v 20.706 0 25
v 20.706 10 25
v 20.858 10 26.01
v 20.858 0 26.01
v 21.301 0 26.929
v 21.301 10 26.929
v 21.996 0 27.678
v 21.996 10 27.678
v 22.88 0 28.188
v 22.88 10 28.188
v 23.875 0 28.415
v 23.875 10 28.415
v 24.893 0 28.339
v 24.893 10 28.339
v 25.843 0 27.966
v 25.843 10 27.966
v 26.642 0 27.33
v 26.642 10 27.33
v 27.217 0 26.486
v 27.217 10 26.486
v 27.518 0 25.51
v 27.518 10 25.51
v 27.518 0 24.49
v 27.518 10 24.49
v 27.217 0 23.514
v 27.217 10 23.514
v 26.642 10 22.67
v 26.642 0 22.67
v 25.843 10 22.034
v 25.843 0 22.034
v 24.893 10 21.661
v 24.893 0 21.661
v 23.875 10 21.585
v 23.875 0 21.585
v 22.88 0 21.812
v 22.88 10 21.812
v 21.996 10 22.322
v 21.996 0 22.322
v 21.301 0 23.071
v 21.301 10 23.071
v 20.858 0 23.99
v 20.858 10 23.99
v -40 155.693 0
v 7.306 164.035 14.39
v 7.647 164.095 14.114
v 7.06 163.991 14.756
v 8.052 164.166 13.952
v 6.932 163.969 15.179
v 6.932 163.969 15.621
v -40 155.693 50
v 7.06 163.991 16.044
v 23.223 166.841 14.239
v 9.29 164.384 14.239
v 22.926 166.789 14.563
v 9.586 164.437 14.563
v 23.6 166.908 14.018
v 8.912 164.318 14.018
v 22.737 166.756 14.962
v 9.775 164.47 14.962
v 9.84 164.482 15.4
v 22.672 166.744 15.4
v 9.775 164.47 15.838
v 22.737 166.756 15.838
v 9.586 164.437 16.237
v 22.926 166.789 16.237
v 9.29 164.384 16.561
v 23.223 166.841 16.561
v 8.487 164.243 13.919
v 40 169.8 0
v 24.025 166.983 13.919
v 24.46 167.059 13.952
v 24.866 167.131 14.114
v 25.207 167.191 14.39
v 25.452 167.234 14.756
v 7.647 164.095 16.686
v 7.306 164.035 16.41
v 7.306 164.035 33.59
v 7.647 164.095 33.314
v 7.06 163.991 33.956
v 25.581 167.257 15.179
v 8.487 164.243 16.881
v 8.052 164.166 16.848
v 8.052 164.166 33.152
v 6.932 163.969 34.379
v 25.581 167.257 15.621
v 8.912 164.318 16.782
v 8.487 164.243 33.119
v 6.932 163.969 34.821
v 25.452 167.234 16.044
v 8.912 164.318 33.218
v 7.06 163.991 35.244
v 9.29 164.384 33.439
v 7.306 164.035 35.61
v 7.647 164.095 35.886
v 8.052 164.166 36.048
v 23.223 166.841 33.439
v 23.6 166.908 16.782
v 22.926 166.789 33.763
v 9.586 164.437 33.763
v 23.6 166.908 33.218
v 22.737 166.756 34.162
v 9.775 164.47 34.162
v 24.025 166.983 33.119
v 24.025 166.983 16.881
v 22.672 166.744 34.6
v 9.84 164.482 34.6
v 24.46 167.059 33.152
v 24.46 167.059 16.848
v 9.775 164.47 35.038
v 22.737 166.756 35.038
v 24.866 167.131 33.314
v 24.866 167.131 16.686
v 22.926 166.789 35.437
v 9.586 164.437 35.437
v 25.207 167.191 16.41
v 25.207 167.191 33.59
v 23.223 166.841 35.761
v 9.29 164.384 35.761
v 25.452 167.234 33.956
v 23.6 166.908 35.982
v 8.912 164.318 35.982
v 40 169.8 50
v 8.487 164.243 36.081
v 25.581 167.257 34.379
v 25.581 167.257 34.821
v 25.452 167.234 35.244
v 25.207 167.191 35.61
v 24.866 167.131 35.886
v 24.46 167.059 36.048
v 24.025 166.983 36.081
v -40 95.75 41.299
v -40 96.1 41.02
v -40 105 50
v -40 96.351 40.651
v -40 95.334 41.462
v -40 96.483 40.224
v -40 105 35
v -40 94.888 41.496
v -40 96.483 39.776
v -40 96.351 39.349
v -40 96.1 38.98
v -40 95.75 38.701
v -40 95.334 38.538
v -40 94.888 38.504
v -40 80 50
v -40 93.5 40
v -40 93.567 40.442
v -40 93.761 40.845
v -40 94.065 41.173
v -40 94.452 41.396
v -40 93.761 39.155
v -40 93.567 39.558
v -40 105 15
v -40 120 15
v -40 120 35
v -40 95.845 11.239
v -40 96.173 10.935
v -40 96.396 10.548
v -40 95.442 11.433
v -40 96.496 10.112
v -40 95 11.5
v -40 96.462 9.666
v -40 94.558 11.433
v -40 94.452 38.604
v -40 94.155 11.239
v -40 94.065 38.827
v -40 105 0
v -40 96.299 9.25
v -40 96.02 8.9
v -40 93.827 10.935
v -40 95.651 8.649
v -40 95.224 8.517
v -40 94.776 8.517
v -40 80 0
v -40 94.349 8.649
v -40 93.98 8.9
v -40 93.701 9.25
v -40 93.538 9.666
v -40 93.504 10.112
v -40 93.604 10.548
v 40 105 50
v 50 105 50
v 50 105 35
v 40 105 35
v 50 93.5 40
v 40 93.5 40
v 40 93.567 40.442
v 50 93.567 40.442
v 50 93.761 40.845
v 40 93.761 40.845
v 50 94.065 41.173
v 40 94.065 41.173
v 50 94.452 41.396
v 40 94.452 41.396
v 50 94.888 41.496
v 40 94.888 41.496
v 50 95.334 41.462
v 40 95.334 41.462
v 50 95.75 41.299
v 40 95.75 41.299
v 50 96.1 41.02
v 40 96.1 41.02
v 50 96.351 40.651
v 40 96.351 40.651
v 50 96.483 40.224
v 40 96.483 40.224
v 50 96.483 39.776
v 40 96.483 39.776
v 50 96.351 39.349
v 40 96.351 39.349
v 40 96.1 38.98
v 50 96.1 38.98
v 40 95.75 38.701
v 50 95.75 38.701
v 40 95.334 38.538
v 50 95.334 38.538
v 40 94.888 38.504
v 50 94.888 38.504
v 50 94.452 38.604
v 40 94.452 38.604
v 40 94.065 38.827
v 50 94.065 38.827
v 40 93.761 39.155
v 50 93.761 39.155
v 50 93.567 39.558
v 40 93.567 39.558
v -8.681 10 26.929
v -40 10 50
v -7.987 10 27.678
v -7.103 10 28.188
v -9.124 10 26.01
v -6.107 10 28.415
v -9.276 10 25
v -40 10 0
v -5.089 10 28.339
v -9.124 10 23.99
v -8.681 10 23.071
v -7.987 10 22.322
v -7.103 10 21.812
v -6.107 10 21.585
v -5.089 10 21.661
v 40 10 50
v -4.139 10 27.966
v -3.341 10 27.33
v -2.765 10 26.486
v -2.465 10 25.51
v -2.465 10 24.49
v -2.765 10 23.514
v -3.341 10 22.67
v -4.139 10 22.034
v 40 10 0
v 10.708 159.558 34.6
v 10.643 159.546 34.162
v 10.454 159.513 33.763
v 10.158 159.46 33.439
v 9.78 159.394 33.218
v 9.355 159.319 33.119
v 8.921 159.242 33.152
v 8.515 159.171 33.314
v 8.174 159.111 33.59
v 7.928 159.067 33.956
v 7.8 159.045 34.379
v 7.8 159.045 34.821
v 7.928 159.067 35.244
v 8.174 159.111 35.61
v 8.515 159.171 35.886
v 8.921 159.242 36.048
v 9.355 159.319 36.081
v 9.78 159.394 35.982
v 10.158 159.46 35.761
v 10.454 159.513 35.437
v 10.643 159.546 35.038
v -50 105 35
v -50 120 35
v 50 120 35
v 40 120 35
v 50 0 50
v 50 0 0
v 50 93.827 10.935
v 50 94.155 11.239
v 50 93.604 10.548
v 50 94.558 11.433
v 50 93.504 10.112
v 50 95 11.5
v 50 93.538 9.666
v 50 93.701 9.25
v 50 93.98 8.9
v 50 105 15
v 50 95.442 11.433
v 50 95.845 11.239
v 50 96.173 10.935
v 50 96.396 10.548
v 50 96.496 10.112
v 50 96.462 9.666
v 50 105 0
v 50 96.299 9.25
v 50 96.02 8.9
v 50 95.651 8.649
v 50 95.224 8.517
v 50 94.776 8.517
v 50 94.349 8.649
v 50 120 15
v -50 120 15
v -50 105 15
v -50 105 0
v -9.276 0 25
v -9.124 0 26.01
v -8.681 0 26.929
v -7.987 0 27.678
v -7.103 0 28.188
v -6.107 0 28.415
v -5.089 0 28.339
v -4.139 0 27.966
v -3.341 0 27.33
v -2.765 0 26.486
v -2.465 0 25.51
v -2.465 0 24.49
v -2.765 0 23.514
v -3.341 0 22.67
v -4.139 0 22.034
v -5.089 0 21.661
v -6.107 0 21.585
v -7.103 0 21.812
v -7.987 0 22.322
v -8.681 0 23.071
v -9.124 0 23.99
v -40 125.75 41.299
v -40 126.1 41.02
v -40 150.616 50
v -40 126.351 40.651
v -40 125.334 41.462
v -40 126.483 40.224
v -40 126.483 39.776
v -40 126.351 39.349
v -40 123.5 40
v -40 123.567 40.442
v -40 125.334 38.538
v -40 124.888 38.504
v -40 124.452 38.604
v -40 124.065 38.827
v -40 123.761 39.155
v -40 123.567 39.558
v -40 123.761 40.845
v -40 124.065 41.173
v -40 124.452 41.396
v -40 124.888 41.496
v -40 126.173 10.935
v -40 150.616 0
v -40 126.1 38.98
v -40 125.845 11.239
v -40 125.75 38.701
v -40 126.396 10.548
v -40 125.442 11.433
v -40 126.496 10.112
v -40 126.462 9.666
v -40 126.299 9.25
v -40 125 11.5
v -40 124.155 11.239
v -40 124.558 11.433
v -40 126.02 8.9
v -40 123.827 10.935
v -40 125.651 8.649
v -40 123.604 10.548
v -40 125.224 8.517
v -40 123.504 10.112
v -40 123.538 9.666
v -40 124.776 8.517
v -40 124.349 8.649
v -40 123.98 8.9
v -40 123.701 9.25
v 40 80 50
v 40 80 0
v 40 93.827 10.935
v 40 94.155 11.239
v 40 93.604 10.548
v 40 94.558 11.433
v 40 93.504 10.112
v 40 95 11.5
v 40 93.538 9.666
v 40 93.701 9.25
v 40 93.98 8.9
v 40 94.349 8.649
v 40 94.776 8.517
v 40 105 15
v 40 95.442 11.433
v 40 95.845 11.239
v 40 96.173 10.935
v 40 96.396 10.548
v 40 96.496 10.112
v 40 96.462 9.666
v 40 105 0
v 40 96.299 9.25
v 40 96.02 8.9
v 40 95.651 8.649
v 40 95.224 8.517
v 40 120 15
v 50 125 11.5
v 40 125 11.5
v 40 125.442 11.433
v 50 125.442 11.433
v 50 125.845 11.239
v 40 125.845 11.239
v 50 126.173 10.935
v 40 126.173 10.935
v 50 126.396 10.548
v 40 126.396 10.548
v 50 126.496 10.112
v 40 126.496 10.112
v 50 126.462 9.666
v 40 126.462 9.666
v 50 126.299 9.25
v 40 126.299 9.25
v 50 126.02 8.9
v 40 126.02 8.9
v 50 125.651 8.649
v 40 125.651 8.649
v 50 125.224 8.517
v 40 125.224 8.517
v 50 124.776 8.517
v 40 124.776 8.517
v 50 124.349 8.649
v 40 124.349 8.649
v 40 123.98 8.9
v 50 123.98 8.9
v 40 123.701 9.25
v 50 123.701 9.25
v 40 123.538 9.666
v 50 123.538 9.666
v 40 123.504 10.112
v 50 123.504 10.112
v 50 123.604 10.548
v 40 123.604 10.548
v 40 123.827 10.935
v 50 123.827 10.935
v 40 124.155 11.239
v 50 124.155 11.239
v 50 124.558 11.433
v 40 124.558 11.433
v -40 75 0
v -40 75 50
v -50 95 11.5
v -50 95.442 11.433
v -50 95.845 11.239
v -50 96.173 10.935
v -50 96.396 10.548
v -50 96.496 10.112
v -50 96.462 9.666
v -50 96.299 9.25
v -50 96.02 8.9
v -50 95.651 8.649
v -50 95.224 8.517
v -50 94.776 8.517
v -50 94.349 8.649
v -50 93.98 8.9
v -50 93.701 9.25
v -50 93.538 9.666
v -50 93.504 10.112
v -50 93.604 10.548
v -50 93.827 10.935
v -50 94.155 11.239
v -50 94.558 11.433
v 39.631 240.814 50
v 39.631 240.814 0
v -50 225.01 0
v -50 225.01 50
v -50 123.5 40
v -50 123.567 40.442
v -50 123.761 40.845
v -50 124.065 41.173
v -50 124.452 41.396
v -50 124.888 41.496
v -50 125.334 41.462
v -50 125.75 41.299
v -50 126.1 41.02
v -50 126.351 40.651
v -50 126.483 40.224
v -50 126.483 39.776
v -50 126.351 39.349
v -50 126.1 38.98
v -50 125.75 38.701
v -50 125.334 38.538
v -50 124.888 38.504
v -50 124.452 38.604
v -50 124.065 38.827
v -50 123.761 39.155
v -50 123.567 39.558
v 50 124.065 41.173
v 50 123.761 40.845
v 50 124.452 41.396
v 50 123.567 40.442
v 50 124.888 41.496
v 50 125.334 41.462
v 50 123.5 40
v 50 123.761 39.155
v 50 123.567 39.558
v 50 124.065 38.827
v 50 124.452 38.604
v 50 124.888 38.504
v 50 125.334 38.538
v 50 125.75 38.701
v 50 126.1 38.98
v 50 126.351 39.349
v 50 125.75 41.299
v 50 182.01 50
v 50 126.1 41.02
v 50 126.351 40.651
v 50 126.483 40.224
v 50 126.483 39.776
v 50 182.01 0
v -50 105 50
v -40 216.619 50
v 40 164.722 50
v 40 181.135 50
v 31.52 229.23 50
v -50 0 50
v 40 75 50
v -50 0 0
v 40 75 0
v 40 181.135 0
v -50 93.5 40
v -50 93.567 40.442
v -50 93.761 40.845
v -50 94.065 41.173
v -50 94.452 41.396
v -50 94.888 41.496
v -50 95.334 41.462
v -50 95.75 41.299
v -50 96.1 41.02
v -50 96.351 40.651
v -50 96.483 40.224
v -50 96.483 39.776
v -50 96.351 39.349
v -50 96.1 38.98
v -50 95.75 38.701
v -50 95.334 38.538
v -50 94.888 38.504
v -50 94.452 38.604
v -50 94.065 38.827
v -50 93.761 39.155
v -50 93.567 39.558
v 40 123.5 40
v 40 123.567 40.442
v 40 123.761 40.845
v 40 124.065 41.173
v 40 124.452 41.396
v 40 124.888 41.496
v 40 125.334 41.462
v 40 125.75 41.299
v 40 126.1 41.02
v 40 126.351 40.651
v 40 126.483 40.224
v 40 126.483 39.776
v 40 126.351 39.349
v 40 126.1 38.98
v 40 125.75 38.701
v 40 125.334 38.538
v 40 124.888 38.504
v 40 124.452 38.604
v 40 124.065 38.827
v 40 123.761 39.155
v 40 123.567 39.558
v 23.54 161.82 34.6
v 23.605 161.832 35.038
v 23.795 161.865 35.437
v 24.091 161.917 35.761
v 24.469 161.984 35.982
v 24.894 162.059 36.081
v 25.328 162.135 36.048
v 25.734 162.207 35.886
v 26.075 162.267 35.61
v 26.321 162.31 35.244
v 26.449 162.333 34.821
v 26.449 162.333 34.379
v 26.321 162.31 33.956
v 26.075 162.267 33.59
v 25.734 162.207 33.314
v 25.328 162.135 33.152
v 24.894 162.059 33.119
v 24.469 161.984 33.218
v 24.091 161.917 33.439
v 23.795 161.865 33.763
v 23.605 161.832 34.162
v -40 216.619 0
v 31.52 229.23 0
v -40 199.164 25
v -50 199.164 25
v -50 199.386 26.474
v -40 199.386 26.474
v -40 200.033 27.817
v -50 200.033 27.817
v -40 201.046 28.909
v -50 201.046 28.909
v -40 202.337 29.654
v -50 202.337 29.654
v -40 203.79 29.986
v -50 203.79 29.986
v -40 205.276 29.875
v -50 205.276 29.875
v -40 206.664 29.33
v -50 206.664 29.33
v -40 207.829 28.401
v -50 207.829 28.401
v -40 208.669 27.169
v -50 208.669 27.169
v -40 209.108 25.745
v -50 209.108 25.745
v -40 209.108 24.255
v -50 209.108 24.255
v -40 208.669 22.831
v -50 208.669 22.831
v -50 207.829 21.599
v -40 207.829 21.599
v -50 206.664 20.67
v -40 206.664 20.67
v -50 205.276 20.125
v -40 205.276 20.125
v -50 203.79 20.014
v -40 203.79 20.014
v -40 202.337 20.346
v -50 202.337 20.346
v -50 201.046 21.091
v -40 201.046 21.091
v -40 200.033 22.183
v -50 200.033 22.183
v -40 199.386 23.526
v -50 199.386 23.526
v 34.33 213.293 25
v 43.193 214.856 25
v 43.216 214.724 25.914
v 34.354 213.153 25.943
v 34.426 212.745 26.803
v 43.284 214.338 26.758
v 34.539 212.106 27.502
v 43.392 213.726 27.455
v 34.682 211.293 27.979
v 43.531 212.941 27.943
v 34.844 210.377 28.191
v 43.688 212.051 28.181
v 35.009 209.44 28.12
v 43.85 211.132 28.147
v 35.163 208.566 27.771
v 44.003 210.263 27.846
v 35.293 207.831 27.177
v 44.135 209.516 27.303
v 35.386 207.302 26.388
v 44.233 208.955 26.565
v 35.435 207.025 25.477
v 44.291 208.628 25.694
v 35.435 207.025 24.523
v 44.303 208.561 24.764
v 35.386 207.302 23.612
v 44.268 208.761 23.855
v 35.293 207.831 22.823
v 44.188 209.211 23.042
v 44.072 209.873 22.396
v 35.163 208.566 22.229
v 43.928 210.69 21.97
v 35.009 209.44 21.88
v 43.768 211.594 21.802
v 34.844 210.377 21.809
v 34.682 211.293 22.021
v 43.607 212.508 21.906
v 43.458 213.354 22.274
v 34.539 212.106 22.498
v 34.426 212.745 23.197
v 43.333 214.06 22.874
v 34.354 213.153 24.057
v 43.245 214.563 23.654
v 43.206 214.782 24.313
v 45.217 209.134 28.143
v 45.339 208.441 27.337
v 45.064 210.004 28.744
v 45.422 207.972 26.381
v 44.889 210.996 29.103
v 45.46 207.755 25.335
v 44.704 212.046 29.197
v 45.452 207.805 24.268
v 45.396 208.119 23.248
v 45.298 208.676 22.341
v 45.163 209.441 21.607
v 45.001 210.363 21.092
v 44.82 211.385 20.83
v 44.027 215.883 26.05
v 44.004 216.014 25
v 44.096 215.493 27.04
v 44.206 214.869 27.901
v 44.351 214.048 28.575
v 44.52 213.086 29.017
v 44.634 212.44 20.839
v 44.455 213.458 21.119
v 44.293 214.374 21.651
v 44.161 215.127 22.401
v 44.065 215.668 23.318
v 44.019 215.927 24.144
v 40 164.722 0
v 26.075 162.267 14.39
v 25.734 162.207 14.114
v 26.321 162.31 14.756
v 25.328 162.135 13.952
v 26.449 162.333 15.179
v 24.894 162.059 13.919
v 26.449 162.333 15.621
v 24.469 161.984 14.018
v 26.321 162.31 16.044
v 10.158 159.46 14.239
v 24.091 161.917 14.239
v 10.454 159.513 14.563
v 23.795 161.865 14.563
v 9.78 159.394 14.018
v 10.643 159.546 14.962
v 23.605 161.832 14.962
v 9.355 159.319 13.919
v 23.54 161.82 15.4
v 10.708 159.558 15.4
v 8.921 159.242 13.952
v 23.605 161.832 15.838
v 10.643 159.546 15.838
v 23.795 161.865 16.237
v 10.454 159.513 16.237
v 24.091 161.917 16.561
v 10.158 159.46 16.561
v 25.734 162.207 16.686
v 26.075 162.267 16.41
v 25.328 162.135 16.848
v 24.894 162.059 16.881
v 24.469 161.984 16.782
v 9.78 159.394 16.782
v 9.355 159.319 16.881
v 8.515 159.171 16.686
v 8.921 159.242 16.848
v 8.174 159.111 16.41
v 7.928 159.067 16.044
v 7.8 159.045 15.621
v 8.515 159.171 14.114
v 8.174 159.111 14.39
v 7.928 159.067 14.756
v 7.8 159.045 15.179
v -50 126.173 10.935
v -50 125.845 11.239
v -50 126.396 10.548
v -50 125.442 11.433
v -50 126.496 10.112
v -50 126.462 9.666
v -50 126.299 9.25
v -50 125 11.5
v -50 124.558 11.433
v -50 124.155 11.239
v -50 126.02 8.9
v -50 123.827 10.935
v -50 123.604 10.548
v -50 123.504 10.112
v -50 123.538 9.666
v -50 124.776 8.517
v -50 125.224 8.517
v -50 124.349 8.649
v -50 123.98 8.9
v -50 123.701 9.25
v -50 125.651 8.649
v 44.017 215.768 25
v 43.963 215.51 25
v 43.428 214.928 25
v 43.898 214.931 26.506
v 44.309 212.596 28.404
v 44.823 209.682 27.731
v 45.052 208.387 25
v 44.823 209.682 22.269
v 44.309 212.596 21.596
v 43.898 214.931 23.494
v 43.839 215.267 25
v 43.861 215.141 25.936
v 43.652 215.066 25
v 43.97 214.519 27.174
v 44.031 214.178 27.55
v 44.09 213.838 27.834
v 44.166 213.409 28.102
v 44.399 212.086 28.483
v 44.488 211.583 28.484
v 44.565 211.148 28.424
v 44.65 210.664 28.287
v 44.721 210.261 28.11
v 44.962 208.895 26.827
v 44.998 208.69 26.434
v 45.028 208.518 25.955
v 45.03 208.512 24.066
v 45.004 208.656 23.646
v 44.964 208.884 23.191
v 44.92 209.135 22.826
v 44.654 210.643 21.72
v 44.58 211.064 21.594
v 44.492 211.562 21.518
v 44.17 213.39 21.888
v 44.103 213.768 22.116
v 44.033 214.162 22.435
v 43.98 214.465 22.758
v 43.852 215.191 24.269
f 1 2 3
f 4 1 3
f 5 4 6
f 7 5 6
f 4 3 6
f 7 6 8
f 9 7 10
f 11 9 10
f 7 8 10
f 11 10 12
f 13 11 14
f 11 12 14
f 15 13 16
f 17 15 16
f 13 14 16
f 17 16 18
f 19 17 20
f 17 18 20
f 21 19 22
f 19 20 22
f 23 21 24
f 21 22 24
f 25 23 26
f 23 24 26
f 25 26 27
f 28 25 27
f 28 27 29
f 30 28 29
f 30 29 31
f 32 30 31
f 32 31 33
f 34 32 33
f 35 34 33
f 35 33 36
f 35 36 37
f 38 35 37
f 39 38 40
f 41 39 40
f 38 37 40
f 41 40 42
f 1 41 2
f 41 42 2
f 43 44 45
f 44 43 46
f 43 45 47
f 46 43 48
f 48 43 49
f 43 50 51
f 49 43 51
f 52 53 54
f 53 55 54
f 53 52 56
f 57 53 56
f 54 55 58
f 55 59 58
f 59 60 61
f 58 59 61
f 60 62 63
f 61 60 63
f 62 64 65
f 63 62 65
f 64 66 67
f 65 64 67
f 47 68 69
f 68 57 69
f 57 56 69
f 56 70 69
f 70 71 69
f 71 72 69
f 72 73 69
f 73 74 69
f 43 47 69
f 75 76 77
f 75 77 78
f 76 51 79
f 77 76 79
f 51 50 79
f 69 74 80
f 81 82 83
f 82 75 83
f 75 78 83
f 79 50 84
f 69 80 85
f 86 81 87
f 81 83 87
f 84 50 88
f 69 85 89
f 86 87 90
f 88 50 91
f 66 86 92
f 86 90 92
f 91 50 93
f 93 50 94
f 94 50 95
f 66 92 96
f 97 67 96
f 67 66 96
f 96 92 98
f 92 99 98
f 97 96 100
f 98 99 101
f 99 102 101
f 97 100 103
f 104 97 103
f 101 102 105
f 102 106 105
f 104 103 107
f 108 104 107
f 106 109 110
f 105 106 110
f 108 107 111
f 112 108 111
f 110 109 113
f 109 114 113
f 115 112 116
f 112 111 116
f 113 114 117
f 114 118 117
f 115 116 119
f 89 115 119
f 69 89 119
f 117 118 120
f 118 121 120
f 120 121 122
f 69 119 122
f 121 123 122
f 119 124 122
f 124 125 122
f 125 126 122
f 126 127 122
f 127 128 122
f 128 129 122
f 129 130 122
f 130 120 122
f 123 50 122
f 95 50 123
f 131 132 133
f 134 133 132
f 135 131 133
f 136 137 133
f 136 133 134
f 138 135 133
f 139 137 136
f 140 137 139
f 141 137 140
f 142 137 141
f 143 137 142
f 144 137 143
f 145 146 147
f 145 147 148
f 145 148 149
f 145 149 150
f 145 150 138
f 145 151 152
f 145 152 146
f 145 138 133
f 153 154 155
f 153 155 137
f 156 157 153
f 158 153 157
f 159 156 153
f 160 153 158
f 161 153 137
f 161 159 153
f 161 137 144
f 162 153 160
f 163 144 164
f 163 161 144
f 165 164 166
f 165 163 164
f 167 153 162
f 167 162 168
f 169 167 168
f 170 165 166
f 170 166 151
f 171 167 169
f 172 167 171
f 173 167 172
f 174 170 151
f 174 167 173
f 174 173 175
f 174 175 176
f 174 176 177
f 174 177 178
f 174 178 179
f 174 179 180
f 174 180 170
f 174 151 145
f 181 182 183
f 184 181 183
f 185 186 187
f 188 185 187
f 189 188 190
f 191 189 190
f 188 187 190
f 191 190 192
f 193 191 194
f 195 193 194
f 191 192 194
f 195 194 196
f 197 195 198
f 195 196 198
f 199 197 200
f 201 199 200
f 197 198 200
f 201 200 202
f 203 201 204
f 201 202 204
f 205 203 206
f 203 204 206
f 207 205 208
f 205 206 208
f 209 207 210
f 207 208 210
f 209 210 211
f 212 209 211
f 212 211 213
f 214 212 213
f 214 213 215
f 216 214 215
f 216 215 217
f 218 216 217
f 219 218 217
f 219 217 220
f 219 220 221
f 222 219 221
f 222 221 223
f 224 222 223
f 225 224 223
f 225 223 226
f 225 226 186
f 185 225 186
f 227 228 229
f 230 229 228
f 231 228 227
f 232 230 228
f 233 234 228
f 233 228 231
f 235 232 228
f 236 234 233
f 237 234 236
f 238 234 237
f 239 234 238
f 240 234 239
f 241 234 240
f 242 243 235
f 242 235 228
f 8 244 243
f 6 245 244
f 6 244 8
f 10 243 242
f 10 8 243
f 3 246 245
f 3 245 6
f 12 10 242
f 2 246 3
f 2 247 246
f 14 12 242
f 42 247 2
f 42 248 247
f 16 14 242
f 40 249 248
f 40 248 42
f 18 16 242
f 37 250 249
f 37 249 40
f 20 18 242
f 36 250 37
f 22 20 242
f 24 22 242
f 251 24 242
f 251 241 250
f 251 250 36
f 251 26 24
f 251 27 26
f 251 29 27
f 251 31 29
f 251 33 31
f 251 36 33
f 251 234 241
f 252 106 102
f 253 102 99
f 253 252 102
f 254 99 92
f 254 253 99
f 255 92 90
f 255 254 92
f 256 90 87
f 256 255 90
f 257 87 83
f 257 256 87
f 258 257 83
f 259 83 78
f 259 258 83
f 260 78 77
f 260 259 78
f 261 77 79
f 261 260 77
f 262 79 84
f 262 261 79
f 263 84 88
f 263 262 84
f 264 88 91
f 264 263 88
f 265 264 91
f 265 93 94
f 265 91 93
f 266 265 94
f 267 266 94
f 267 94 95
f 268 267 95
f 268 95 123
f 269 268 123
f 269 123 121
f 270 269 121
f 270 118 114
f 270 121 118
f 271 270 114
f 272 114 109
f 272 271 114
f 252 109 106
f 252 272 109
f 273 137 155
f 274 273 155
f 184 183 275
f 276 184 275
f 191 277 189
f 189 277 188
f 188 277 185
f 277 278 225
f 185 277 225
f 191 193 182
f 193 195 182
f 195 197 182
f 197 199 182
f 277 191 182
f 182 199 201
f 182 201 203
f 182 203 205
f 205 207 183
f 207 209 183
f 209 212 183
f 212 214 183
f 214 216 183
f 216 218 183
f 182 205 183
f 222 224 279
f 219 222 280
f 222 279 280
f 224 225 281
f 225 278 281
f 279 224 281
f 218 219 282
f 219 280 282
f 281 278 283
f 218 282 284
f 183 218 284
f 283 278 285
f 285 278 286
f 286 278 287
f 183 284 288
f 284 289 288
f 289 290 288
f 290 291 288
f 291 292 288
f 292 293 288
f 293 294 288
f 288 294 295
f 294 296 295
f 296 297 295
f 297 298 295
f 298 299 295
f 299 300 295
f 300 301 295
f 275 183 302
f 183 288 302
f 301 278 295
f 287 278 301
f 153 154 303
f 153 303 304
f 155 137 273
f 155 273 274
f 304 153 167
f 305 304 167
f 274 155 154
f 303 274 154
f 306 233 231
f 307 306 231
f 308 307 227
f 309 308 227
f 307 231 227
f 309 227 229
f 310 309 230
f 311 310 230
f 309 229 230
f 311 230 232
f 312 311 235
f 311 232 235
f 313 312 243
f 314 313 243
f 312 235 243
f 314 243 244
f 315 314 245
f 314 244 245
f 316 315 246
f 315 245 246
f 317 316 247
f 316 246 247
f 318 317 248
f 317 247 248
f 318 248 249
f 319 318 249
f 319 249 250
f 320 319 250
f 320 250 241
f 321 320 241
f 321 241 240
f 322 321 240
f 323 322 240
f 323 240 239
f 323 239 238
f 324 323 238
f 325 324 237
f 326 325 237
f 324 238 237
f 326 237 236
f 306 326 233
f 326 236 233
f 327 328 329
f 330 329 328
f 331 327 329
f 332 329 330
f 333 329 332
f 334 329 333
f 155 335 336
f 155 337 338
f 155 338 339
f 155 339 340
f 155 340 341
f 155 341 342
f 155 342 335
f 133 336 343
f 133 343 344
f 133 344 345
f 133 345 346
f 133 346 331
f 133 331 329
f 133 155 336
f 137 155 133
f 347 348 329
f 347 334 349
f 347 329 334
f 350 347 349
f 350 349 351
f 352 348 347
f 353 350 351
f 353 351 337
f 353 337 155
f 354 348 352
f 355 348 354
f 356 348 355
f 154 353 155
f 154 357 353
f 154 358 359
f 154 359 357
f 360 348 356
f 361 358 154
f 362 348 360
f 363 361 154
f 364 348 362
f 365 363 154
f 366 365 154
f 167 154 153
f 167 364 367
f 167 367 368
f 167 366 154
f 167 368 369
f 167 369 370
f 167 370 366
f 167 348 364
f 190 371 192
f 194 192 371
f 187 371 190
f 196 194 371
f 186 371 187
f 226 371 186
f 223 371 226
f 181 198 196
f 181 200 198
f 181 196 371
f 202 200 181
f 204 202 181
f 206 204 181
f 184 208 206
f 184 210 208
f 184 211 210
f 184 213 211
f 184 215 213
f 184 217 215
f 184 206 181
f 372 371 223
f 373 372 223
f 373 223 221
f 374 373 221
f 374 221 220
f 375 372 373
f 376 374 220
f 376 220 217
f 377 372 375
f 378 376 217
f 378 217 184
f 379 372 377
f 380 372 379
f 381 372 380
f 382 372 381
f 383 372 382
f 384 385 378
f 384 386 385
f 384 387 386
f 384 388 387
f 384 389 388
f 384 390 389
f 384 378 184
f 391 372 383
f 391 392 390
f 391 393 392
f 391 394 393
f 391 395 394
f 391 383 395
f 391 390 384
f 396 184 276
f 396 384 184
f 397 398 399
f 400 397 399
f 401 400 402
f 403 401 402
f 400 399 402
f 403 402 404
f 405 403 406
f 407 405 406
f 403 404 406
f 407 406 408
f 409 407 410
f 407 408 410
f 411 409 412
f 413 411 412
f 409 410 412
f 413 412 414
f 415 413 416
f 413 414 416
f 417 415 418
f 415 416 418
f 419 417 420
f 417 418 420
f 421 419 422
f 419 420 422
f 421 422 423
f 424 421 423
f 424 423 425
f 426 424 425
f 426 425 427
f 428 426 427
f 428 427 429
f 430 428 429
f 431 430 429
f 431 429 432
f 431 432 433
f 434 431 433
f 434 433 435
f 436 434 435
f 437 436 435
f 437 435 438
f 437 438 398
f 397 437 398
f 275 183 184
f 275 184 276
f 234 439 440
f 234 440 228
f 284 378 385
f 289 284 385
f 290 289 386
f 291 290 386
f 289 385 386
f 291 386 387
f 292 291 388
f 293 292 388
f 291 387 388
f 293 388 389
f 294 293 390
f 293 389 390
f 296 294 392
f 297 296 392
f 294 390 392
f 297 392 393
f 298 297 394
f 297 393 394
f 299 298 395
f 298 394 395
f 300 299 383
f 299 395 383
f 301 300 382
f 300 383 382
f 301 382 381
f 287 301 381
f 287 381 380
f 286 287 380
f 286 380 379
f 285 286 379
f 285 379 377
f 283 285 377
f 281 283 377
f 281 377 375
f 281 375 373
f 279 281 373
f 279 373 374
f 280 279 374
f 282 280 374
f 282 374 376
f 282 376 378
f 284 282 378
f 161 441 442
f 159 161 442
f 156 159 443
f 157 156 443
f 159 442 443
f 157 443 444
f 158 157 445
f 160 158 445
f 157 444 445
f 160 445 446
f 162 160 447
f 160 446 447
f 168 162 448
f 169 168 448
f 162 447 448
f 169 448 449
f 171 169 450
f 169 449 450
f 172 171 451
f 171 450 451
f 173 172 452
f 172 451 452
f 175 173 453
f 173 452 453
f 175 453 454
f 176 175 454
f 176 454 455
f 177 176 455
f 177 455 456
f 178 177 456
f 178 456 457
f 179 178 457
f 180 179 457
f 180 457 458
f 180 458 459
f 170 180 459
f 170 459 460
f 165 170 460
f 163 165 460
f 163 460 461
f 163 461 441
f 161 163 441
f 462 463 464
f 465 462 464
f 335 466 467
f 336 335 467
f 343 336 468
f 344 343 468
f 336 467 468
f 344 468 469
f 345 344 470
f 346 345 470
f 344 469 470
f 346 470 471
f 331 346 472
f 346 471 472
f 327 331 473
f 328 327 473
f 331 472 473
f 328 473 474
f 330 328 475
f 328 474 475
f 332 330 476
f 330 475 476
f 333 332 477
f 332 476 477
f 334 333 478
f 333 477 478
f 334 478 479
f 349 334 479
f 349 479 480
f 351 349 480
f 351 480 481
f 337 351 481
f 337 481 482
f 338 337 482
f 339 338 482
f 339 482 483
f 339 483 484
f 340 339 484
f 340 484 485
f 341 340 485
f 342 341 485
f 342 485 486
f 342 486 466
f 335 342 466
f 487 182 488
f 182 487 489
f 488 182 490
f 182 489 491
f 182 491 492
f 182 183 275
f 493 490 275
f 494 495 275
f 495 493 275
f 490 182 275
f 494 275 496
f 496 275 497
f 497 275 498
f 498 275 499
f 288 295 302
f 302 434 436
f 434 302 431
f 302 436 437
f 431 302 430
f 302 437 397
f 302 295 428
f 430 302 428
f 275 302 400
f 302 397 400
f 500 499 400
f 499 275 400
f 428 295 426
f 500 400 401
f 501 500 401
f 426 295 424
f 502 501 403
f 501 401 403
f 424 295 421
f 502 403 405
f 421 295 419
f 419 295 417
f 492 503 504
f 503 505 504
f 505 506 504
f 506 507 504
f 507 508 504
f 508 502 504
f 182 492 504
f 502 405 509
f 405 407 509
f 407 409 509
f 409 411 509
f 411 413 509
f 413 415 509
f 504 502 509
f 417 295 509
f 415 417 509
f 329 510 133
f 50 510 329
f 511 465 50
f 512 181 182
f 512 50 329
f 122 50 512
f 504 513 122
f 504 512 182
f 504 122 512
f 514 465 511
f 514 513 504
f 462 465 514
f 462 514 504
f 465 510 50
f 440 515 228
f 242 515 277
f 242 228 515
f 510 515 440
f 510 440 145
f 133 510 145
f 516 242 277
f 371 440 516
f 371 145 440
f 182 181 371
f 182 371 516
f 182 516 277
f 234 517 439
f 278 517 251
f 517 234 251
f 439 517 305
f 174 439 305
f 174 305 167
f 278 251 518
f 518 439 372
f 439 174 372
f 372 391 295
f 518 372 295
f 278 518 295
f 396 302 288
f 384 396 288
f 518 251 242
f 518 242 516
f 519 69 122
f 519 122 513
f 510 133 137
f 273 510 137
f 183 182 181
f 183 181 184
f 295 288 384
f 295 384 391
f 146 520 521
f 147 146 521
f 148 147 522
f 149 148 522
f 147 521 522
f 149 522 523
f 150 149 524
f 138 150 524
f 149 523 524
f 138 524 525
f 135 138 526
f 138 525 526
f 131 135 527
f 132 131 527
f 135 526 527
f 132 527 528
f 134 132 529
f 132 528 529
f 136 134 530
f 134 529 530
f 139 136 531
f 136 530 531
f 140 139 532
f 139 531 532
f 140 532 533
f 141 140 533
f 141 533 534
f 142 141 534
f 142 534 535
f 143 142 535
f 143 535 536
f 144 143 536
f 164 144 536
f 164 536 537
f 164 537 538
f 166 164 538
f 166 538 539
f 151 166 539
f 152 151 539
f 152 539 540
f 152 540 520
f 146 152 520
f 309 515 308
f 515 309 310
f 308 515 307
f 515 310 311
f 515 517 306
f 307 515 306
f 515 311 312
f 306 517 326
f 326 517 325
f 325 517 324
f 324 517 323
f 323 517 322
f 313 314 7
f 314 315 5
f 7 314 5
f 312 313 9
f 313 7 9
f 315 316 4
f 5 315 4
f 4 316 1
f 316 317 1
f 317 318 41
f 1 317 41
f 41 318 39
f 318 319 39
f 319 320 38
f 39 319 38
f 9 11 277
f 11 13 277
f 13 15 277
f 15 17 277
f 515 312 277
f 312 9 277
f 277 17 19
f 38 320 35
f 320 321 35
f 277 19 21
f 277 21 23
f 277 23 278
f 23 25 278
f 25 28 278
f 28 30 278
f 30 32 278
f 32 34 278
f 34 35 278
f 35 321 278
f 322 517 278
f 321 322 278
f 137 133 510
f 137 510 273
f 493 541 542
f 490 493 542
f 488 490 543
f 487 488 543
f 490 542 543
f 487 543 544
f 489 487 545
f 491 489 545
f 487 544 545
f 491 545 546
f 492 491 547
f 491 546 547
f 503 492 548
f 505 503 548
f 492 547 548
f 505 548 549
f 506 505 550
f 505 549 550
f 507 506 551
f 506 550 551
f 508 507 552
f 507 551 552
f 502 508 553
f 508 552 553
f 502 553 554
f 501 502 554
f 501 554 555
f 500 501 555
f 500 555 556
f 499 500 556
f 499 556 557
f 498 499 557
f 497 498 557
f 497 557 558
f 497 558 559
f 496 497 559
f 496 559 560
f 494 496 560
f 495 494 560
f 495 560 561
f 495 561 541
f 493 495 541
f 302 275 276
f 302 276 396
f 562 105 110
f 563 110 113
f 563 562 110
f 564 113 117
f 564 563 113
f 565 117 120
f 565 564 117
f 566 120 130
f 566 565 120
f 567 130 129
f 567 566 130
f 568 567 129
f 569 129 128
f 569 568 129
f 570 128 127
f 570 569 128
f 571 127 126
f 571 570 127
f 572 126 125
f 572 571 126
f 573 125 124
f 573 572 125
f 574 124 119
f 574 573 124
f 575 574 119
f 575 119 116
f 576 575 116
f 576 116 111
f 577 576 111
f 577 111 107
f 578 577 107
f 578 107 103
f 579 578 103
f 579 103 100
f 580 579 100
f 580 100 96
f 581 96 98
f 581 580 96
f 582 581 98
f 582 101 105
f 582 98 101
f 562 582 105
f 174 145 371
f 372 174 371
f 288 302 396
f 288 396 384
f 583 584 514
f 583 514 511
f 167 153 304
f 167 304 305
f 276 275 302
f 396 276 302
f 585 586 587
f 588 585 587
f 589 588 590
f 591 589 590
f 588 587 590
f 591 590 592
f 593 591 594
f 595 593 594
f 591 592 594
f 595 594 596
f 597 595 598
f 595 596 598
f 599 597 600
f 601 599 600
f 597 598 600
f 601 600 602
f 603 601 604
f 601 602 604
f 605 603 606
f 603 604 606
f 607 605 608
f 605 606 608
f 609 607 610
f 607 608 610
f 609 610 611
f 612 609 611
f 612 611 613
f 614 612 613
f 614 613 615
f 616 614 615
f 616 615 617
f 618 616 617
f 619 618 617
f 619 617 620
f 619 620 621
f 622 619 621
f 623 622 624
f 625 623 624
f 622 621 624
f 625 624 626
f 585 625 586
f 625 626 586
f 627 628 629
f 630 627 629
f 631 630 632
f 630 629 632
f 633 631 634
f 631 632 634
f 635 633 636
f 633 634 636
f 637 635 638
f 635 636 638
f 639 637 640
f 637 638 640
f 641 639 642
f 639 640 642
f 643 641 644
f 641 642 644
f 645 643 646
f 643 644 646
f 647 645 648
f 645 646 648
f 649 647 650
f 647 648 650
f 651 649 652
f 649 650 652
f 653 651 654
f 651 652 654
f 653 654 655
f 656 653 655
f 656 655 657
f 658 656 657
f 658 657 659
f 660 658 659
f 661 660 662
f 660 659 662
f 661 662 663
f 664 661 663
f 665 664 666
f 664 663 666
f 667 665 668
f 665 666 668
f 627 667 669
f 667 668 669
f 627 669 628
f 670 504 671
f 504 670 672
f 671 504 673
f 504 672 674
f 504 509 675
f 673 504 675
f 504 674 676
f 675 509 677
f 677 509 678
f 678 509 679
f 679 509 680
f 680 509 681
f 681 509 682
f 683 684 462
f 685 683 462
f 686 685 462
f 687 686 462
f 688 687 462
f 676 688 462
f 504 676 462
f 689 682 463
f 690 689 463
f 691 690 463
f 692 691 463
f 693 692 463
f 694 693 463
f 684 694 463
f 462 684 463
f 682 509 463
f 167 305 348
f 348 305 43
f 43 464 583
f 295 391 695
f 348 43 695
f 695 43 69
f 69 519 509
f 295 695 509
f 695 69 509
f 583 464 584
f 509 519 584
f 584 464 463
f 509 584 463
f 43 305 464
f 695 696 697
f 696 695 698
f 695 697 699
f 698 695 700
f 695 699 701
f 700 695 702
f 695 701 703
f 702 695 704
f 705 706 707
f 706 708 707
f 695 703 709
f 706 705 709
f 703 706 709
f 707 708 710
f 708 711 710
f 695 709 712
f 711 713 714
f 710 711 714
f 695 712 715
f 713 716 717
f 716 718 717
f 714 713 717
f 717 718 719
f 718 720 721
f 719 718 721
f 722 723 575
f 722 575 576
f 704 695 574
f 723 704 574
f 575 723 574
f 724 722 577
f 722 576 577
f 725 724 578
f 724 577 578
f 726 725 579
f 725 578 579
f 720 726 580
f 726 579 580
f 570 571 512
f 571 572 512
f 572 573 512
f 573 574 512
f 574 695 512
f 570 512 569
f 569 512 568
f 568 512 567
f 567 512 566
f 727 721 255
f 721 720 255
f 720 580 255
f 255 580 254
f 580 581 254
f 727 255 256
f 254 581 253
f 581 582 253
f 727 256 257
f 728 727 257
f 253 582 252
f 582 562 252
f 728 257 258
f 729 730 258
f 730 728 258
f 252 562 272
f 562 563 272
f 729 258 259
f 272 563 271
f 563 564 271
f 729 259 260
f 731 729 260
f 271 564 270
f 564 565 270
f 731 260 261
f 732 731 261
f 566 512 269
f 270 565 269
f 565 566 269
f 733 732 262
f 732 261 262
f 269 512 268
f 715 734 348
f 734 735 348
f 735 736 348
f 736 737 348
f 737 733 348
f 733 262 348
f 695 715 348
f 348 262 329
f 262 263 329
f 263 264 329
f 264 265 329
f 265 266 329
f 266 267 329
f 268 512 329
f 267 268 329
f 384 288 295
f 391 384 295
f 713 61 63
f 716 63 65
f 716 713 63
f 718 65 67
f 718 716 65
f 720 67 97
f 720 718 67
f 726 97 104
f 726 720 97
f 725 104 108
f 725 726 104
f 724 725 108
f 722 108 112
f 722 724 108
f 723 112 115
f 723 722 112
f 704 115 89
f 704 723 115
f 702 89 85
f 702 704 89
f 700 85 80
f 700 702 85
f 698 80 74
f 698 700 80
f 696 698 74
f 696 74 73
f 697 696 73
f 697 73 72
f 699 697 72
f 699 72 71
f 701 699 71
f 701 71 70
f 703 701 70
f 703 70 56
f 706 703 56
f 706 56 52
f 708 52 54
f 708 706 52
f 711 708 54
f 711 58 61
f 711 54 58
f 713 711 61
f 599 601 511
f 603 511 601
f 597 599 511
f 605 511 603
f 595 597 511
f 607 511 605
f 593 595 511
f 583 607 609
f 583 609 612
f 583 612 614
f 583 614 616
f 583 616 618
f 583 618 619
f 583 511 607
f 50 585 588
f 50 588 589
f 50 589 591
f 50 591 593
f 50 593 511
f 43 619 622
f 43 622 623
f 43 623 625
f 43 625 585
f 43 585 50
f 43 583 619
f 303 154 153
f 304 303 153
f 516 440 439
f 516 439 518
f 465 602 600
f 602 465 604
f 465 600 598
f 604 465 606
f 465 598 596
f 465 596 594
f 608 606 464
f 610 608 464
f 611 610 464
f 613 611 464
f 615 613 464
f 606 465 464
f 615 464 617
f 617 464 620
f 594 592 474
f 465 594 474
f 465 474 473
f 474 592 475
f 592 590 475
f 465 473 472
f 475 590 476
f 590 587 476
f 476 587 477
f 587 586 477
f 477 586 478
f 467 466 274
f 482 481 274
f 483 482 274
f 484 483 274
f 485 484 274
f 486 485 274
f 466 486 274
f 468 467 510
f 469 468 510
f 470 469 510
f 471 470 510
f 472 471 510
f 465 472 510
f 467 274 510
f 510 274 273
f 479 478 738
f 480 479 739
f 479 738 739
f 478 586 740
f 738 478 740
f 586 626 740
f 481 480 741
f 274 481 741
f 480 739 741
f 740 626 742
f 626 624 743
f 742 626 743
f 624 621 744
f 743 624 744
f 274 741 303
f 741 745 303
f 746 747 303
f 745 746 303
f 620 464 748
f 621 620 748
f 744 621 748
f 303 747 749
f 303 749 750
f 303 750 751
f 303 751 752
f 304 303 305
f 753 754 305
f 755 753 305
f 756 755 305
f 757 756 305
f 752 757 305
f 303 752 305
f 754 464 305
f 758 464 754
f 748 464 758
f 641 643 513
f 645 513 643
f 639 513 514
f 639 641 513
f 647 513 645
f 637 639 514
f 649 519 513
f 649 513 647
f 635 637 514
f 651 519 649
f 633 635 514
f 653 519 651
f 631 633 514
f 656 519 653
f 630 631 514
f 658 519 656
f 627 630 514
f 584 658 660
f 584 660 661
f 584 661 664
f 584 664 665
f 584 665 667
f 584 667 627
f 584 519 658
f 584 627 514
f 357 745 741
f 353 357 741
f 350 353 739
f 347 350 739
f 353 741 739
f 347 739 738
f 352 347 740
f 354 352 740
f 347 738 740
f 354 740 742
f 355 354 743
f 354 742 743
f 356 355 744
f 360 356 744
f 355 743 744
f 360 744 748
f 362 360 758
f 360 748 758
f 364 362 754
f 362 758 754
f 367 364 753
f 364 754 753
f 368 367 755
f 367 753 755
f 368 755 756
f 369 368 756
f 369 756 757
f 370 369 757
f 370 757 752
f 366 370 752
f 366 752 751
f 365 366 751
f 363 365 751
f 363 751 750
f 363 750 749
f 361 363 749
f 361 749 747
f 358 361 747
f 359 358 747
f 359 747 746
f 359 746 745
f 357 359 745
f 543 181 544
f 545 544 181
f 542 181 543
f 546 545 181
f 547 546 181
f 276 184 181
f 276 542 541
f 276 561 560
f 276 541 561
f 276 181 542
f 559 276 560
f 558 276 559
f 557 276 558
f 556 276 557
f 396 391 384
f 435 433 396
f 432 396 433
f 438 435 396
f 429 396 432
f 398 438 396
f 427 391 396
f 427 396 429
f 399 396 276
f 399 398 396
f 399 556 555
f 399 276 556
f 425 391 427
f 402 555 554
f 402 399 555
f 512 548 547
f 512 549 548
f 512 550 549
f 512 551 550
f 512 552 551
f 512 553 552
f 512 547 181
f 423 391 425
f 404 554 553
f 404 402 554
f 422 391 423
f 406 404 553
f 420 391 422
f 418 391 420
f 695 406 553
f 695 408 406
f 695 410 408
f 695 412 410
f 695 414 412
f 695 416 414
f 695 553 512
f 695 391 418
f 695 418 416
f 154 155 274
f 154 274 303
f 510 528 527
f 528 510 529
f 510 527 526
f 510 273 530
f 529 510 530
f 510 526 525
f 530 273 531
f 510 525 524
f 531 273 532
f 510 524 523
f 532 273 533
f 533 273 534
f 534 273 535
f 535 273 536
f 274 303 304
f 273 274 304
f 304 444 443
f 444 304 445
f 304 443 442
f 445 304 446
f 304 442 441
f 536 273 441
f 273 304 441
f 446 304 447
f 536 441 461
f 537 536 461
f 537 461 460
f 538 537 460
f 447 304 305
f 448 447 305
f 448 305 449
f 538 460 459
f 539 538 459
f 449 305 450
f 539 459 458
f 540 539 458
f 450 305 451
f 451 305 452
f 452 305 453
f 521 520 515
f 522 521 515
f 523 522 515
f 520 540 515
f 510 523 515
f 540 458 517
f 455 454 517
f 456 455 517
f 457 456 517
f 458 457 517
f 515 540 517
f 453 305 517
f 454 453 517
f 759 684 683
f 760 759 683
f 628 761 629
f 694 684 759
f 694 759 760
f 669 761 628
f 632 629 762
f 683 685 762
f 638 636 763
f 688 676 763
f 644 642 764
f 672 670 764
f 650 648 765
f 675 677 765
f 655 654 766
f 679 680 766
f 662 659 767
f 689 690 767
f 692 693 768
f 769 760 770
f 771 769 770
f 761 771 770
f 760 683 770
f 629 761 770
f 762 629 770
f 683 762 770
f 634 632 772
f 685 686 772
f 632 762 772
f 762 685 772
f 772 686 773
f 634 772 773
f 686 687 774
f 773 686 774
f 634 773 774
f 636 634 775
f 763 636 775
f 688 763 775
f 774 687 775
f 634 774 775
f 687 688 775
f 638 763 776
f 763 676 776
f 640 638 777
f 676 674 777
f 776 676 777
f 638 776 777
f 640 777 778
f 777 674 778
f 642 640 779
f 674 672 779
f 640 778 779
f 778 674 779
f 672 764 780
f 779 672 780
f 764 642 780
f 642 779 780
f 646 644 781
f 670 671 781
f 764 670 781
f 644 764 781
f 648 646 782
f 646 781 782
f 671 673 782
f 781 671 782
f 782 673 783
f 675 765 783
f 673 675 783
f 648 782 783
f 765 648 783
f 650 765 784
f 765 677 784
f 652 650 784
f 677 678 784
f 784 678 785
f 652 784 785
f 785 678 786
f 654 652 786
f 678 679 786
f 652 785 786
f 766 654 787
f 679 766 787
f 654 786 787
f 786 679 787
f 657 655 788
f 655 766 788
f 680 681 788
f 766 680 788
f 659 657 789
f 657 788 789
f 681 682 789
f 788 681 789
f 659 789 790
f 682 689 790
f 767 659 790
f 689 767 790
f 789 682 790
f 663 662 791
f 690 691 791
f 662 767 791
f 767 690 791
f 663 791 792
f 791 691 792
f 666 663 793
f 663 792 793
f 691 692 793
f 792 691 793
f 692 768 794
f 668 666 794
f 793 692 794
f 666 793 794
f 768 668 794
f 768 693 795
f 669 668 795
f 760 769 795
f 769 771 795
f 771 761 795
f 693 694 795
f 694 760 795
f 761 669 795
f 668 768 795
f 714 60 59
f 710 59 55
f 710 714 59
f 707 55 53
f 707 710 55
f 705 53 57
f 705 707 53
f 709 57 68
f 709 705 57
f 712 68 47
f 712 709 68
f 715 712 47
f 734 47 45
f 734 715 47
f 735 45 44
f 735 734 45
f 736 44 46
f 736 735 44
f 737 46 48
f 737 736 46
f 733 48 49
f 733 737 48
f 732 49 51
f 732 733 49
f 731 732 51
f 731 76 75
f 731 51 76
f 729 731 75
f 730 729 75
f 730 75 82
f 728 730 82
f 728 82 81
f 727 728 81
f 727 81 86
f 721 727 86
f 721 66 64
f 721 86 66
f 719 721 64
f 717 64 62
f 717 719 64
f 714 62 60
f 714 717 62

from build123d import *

# Parameters (mm, degrees)
BOSS_EXTRUDE1_DEPTH    = 50
SKETCH4_R              = 3.2
CUT_EXTRUDE1_DEPTH     = 10
BOSS_EXTRUDE2_DEPTH    = 50
SKETCH8_R              = 5
CUT_EXTRUDE3_DEPTH     = 10
CUT_EXTRUDE4_REACH     = 260.512
SKETCH9_R              = 1.485
SKETCH10_R             = 3.425
CUT_EXTRUDE5_DEPTH     = 10
SKETCH11_W             = 80
SKETCH11_H             = 5
BOSS_EXTRUDE3_DEPTH    = 50
FILLET1_R              = 1
SKETCH13_R             = 1.5
CUT_EXTRUDE6_DEPTH     = 266.502494397
SPLIT1_SURFACE_1_BACK  = 266.502
SPLIT1_SURFACE_1_DEPTH = 533.004
SPLIT1_SURFACE_2_BACK  = 266.502
SPLIT1_SURFACE_2_DEPTH = 533.004


with BuildPart() as part:
    # Sketch2 → Boss-Extrude1 (new body)
    with BuildSketch(Plane.XY):
        Polygon((-50, 225.01), (-50, 0), (50, 0), (50, 182.01), (39.631197958, 240.814398513), align=None)
        Polygon((-40, 216.619003688), (-40, 10), (40, 10), (40, 181.135113365), (31.519602204, 229.229839206), align=None, mode=Mode.SUBTRACT)
    extrude(amount=BOSS_EXTRUDE1_DEPTH)

    # Sketch4 → Cut-Extrude1 (cut)
    with BuildSketch(Plane(origin=(79.617858663, 14.038776629, 0), x_dir=(0, 0, -1), z_dir=(0.9848077530122079, 0.17364817766693136, 0))):
        with Locations(Location((-25, 200.891001389, 0), (0, 0, 90))):
            Circle(SKETCH4_R)
    extrude(amount=-CUT_EXTRUDE1_DEPTH, mode=Mode.SUBTRACT)

    # Sketch7 → Boss-Extrude2 (add)
    with BuildSketch(Plane.XY.offset(50)):
        Polygon((40, 169.799565432), (40, 164.722432372), (-40, 150.616273916), (-40, 155.693406975), align=None)
    extrude(amount=-BOSS_EXTRUDE2_DEPTH)

    # Sketch8 → Cut-Extrude3 (cut)
    with BuildSketch(Plane.ZY.offset(50)):
        with Locations(Location((25, 204.163858422, 0), (0, 0, 270))):
            Circle(SKETCH8_R)
    extrude(amount=-CUT_EXTRUDE3_DEPTH, mode=Mode.SUBTRACT)

    # Sketch9 → Cut-Extrude4 (cut, up to next)
    with BuildSketch(Plane(origin=(128.377379322, 180.305748831, 0), x_dir=(-0.9848077530122079, -0.17364817766693152, 0), z_dir=(-0.17364817766693152, 0.9848077530122079, 0)), mode=Mode.PRIVATE) as cut_extrude4_sk1:
        with Locations((104.969193438, 15.4)):
            Circle(SKETCH9_R)
    cut_extrude4_tool1 = extrude(cut_extrude4_sk1.sketch, amount=CUT_EXTRUDE4_REACH, mode=Mode.PRIVATE) & part.part
    # Sketch9 → Cut-Extrude4 (cut, up to next)
    with BuildSketch(Plane(origin=(128.377379322, 180.305748831, 0), x_dir=(-0.9848077530122079, -0.17364817766693152, 0), z_dir=(-0.17364817766693152, 0.9848077530122079, 0)), mode=Mode.PRIVATE) as cut_extrude4_sk2:
        with Locations((104.969193438, 34.6)):
            Circle(SKETCH9_R)
    cut_extrude4_tool2 = extrude(cut_extrude4_sk2.sketch, amount=CUT_EXTRUDE4_REACH, mode=Mode.PRIVATE) & part.part
    # Sketch9 → Cut-Extrude4 (cut, up to next)
    with BuildSketch(Plane(origin=(128.377379322, 180.305748831, 0), x_dir=(-0.9848077530122079, -0.17364817766693152, 0), z_dir=(-0.17364817766693152, 0.9848077530122079, 0)), mode=Mode.PRIVATE) as cut_extrude4_sk3:
        with Locations(Location((120.969193438, 34.6, 0), (0, 0, 180))):
            Circle(SKETCH9_R)
    cut_extrude4_tool3 = extrude(cut_extrude4_sk3.sketch, amount=CUT_EXTRUDE4_REACH, mode=Mode.PRIVATE) & part.part
    # Sketch9 → Cut-Extrude4 (cut, up to next)
    with BuildSketch(Plane(origin=(128.377379322, 180.305748831, 0), x_dir=(-0.9848077530122079, -0.17364817766693152, 0), z_dir=(-0.17364817766693152, 0.9848077530122079, 0)), mode=Mode.PRIVATE) as cut_extrude4_sk4:
        with Locations(Location((120.969193438, 15.4, 0), (0, 0, 180))):
            Circle(SKETCH9_R)
    cut_extrude4_tool4 = extrude(cut_extrude4_sk4.sketch, amount=CUT_EXTRUDE4_REACH, mode=Mode.PRIVATE) & part.part
    add(cut_extrude4_tool1.solids().sort_by_distance((25.002904, 162.07804, 15.4))[0], mode=Mode.SUBTRACT)
    add(cut_extrude4_tool2.solids().sort_by_distance((25.002904, 162.07804, 34.6))[0], mode=Mode.SUBTRACT)
    add(cut_extrude4_tool3.solids().sort_by_distance((9.24598, 159.299669, 34.6))[0], mode=Mode.SUBTRACT)
    add(cut_extrude4_tool4.solids().sort_by_distance((9.24598, 159.299669, 15.4))[0], mode=Mode.SUBTRACT)

    # Sketch10 → Cut-Extrude5 (cut)
    with BuildSketch(Plane(origin=(0, 10, 0), x_dir=(1, 0, 0), z_dir=(0, 1, 0))):
        with Locations(Location((-5.851287133, -25, 0), (0, 0, 180))):
            Circle(SKETCH10_R)
        with Locations(Location((24.130974018, -25, 0), (0, 0, 180))):
            Circle(SKETCH10_R)
    extrude(amount=-CUT_EXTRUDE5_DEPTH, mode=Mode.SUBTRACT)

    # Sketch11 → Boss-Extrude3 (add)
    with BuildSketch(Plane.XY.offset(50)):
        with Locations((0, 77.5)):
            Rectangle(SKETCH11_W, SKETCH11_H)
    extrude(amount=-BOSS_EXTRUDE3_DEPTH)

    # Fillet1
    fillet1_edges = [part.edges().sort_by_distance(p)[0] for p in [
        (45.289176531, 208.726407497, 25),
    ]]
    fillet(fillet1_edges, radius=FILLET1_R)

    # Sketch13 → Cut-Extrude6 (cut, through all)
    with BuildSketch(Plane.ZY.offset(50)):
        with Locations(Location((40, 125, 0), (0, 0, 270))):
            Circle(SKETCH13_R)
        with Locations(Location((40, 95, 0), (0, 0, 270))):
            Circle(SKETCH13_R)
        with Locations((10, 95)):
            Circle(SKETCH13_R)
        with Locations((10, 125)):
            Circle(SKETCH13_R)
    extrude(amount=-CUT_EXTRUDE6_DEPTH, mode=Mode.SUBTRACT)


with BuildPart() as body_2:
    # Split1: the piece behind the surface
    add(part.part)
    # Split1 surface: a surface, the sketch's curves swept straight by 533.004 mm
    with BuildLine(Plane.ZY.offset(50).offset(-SPLIT1_SURFACE_1_BACK), mode=Mode.PRIVATE) as split1_surface_1_path:
        Line((50, 105), (35, 105))
        Line((35, 105), (35, 120))
        Line((35, 120), (15, 120))
        Line((15, 120), (15, 105))
        Line((15, 105), (0, 105))
    split1_surface_1 = Shell.extrude(split1_surface_1_path.wire(), (-1 * SPLIT1_SURFACE_1_DEPTH, 0 * SPLIT1_SURFACE_1_DEPTH, 0 * SPLIT1_SURFACE_1_DEPTH))
    split(bisect_by=split1_surface_1, keep=Keep.BOTTOM)


with BuildPart() as part_1:
    add(part.part)

    # Split1: split by a surface, the side it looks to stays
    # Split1 surface: a surface, the sketch's curves swept straight by 533.004 mm
    with BuildLine(Plane.ZY.offset(50).offset(-SPLIT1_SURFACE_2_BACK), mode=Mode.PRIVATE) as split1_surface_2_path:
        Line((50, 105), (35, 105))
        Line((35, 105), (35, 120))
        Line((35, 120), (15, 120))
        Line((15, 120), (15, 105))
        Line((15, 105), (0, 105))
    split1_surface_2 = Shell.extrude(split1_surface_2_path.wire(), (-1 * SPLIT1_SURFACE_2_DEPTH, 0 * SPLIT1_SURFACE_2_DEPTH, 0 * SPLIT1_SURFACE_2_DEPTH))
    split(bisect_by=split1_surface_2, keep=Keep.TOP)


solid = Compound([body_2.part, part_1.part])
